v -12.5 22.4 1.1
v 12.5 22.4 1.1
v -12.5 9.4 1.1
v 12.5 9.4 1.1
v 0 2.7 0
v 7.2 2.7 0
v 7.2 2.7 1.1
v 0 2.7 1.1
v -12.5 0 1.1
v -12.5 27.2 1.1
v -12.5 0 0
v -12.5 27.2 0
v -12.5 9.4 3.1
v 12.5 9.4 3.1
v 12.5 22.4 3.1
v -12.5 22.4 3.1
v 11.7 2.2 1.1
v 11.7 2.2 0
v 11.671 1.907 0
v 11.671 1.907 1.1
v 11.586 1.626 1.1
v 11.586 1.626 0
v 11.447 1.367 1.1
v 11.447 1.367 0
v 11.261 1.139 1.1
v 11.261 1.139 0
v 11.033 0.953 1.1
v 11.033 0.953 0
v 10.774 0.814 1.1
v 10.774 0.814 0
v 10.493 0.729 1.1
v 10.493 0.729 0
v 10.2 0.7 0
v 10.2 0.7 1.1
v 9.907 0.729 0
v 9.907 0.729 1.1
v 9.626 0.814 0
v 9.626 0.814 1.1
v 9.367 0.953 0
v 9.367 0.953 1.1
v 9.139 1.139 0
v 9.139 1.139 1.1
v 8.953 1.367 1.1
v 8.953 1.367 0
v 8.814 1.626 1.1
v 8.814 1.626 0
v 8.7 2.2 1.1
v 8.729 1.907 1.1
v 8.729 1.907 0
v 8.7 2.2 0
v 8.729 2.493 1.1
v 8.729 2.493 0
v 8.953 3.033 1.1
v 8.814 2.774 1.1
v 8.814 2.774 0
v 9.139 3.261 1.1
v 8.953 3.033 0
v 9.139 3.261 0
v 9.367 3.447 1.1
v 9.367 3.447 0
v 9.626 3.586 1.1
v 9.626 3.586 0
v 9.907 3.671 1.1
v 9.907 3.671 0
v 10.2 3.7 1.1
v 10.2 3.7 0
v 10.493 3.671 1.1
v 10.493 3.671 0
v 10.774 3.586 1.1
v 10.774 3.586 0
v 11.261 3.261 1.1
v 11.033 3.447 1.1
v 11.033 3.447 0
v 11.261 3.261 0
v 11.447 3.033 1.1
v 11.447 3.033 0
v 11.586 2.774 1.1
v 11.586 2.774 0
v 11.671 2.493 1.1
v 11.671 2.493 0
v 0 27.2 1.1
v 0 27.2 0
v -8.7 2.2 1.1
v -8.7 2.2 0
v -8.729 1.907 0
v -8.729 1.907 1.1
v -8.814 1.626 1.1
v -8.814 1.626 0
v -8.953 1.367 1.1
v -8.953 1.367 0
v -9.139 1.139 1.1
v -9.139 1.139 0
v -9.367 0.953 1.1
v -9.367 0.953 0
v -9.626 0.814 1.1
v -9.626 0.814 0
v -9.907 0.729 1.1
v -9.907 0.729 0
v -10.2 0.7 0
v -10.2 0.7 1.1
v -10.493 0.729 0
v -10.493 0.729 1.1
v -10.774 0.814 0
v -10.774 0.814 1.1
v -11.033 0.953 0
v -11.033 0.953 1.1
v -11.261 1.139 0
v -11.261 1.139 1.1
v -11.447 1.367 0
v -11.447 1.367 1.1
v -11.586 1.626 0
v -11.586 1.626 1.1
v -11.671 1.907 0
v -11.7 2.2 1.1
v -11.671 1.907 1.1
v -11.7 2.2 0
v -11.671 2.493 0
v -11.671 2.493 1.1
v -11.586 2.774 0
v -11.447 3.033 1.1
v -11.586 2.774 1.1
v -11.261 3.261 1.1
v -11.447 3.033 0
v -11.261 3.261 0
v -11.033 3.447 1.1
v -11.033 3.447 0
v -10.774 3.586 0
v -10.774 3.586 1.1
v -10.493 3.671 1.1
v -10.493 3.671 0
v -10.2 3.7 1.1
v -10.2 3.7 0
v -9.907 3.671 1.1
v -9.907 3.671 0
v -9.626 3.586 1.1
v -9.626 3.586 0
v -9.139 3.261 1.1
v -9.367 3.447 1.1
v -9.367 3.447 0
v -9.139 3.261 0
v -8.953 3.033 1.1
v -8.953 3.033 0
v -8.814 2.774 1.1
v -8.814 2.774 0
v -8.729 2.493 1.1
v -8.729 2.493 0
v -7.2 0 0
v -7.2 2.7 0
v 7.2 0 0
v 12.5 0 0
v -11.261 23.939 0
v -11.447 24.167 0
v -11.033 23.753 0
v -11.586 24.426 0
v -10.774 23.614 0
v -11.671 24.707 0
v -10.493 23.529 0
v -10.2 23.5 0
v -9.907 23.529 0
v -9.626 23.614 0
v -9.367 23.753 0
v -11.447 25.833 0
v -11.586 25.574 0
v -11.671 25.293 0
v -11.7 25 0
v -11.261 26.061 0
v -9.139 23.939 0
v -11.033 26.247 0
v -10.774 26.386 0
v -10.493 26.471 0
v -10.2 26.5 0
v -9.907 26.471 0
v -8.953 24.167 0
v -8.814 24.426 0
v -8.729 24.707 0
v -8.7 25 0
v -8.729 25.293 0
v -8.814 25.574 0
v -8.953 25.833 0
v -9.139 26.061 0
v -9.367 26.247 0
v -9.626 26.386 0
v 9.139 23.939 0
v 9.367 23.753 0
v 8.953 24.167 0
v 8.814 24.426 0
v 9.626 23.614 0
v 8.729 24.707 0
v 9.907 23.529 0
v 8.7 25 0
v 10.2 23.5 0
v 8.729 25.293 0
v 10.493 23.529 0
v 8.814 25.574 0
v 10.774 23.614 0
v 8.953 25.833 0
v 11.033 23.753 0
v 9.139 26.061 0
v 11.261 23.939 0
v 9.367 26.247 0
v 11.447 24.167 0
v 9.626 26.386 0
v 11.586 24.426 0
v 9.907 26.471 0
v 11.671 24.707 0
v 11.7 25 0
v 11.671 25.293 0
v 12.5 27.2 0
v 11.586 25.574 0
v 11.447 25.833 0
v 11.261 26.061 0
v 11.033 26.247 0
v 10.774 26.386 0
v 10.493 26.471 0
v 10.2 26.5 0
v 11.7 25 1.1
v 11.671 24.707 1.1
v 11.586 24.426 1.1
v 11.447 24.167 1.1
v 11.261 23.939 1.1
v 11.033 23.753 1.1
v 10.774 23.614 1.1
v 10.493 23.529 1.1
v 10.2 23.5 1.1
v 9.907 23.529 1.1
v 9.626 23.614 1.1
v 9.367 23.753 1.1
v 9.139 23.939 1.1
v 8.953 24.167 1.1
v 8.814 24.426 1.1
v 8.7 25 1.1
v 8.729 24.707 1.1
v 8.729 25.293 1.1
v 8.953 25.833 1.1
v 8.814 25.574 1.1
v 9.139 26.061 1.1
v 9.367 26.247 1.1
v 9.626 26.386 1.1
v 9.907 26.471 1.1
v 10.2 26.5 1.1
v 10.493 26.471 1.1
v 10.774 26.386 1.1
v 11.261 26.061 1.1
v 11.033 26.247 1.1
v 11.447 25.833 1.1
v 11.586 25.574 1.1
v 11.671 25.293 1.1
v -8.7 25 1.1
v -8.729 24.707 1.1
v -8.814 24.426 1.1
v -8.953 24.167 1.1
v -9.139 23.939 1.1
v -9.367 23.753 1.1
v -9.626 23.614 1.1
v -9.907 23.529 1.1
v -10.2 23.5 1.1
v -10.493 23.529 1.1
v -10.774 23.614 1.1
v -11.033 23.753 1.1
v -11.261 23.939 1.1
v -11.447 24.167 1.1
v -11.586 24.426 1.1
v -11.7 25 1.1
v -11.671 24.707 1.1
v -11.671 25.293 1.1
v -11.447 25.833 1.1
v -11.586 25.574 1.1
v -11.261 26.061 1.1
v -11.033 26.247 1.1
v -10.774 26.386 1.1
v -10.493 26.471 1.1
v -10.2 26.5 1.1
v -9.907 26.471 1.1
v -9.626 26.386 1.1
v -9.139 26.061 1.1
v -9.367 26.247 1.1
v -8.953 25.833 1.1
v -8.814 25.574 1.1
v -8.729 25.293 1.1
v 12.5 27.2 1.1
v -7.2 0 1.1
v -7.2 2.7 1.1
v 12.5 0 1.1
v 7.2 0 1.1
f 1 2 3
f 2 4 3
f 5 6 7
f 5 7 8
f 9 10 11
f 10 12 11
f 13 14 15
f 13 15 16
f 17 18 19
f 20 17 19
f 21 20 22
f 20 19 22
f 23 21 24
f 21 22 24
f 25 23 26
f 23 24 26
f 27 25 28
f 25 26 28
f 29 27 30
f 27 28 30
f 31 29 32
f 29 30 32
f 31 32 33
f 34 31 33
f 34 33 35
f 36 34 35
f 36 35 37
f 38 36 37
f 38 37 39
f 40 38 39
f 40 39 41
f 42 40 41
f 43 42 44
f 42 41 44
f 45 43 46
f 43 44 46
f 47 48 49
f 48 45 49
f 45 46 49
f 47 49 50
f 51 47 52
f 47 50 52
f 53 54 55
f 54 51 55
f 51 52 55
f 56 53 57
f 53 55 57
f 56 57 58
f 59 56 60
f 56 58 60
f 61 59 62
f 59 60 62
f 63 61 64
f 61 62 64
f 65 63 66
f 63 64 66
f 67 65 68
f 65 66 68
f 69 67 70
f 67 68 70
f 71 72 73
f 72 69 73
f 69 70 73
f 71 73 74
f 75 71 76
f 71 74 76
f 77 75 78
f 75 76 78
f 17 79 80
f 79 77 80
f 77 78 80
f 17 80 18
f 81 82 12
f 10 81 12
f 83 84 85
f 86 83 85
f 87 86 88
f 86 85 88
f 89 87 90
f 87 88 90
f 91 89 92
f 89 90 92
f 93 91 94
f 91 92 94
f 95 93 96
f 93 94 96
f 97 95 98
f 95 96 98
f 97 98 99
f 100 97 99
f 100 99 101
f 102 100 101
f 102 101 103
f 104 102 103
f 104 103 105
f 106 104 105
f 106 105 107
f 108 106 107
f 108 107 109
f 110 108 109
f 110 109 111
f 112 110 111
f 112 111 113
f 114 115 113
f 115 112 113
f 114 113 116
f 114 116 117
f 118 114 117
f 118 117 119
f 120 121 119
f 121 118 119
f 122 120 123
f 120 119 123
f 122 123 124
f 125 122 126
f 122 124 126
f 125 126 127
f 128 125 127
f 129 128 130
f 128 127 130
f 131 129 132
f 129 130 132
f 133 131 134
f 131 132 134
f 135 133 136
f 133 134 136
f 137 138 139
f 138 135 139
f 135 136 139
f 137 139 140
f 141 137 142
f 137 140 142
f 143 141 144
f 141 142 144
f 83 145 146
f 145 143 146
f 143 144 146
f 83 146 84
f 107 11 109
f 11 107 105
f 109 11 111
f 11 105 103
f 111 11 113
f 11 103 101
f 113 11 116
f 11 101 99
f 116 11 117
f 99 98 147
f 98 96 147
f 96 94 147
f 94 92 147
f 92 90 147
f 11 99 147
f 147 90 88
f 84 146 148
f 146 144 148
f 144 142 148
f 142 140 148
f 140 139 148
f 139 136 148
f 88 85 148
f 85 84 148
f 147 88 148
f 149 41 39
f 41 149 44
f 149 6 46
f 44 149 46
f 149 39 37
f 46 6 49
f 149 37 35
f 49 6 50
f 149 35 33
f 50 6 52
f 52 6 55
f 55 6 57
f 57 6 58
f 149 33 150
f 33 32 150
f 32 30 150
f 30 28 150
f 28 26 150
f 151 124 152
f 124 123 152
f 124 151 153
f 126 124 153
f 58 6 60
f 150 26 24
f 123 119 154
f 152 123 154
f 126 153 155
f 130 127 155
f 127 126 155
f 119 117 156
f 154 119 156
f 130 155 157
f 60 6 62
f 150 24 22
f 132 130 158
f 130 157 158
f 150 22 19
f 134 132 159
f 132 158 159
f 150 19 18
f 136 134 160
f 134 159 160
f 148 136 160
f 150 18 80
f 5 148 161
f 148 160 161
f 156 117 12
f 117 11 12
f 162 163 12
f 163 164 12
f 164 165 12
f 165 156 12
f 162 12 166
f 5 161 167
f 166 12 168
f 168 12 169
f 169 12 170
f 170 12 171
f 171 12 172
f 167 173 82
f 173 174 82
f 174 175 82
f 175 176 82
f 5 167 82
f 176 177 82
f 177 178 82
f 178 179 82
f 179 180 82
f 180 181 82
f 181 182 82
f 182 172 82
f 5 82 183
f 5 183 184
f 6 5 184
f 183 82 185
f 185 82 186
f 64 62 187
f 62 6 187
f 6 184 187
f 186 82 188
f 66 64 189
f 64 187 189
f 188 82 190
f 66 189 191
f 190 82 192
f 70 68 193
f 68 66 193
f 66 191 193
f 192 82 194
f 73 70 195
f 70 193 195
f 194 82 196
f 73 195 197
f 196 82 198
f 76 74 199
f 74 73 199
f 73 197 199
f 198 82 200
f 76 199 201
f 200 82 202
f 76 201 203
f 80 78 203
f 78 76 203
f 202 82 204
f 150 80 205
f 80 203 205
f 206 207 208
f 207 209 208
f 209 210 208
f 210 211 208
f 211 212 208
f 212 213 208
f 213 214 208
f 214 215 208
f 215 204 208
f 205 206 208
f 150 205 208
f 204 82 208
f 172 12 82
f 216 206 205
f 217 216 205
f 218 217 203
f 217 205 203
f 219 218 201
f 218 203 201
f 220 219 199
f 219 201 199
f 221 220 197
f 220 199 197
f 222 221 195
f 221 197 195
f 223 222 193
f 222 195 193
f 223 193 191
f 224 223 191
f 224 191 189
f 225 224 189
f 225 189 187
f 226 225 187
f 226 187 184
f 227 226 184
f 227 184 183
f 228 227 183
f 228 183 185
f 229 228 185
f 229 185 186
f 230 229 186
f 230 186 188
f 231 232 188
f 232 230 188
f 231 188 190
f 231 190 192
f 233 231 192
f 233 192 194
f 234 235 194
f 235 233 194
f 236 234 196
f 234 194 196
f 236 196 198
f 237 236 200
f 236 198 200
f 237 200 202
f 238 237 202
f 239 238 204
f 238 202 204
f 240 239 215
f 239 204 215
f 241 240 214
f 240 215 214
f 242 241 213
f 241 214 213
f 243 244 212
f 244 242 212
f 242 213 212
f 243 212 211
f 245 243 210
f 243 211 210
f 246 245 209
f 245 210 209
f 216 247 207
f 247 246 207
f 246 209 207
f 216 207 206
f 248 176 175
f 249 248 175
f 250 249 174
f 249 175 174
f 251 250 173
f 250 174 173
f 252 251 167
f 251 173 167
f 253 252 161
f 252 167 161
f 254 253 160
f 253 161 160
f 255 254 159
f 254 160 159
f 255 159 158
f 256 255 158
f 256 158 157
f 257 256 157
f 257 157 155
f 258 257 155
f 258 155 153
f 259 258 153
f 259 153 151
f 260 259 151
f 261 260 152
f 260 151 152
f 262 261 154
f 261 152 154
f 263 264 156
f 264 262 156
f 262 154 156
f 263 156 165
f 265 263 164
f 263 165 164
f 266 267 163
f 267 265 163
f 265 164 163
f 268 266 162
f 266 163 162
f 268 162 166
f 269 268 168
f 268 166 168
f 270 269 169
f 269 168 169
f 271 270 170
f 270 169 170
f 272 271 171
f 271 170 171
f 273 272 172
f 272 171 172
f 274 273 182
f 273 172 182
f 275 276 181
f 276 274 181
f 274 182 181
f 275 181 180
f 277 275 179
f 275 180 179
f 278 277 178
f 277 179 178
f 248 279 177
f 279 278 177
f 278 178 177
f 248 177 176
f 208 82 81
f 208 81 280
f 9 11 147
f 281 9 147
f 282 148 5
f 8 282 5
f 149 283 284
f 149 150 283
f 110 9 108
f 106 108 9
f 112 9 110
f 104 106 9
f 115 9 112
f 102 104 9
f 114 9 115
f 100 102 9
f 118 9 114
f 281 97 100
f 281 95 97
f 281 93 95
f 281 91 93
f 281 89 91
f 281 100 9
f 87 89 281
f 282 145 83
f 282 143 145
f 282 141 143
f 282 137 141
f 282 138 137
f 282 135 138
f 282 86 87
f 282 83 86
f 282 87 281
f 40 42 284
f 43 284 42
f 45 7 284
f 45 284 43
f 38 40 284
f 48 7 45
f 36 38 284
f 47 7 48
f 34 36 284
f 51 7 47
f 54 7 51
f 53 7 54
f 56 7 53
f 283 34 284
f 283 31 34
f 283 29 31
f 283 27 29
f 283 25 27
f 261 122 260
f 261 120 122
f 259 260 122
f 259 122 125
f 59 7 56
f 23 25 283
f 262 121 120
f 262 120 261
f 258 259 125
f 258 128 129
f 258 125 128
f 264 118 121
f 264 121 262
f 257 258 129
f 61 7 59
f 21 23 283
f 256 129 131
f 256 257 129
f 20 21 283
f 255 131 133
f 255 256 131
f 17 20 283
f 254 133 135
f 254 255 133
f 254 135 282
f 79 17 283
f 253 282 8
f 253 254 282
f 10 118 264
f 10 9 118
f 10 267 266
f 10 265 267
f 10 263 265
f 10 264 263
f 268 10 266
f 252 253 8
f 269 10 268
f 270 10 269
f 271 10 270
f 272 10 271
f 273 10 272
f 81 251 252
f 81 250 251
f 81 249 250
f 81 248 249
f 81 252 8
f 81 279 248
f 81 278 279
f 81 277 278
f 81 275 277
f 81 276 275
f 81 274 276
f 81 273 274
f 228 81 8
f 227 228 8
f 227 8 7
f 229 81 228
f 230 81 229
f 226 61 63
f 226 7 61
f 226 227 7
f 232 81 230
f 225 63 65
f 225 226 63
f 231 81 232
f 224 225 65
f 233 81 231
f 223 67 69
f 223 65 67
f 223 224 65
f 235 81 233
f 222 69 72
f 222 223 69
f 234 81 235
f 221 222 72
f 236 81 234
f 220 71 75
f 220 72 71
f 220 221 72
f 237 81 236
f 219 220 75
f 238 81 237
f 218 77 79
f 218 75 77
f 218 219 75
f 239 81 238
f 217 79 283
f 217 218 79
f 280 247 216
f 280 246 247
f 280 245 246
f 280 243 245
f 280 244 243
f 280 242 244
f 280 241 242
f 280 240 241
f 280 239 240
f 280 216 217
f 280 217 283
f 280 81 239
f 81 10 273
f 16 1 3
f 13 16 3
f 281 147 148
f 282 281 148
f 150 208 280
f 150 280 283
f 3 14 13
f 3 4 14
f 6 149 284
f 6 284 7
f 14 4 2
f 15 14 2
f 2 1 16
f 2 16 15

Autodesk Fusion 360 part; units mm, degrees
sketch "Skizze1" plane through (0, 0, 0) normal (0, 0, 1) x (1, 0, 0) in component "board"
  line L0 (0, 0) -> (0, 67.6805) construction
  line L1 (0, 27.2) -> (-12.5, 27.2)
  line L2 (-12.5, 27.2) -> (-12.5, 0)
  line L3 (-12.5, 0) -> (-7.2, 0)
  line L4 (-7.2, 0) -> (-7.2, 2.7)
  line L5 (-7.2, 2.7) -> (0, 2.7)
  circle A0 centre (-10.2, 25) radius 1.5
  circle A1 centre (-10.2, 2.2) radius 1.5
  line L6 (12.5, 27.2) -> (12.5, 0)
  circle A2 centre (10.2, 25) radius 1.5
  circle A3 centre (10.2, 2.2) radius 1.5
  line L7 (12.5, 0) -> (7.2, 0)
  line L8 (7.2, 0) -> (7.2, 2.7)
  line L9 (7.2, 2.7) -> (0, 2.7)
  line L10 (0, 27.2) -> (12.5, 27.2)
  dimension "d1" = 12.5
  dimension "d2" = 27.2
  dimension "d3" = 5.3
  dimension "d4" = 2.7
  dimension "d5" = 3
  dimension "d6" = 2.2
  dimension "d7" = 2.3
  dimension "d8" = 3
  dimension "d9" = 2.3
  dimension "d10" = 2.2
extrude "Extrusion1" add sketch "Skizze1" along normal blind 1.1 makes body 1 in component "board"
sketch "Skizze1 (2)" plane through (0, 0, 1.1) normal (0, 0, 1) x (-1, 0, 0) in component "Component"
  circle A0 centre (-10.2, -2.2) radius 1.5
  circle A1 centre (10.2, -25) radius 1.5
  circle A2 centre (-10.2, -25) radius 1.5
  circle A3 centre (10.2, -2.2) radius 1.5
  line L0 (12.5, -27.2) -> (12.5, 0)
  line L1 (12.5, 0) -> (7.2, 0)
  line L2 (7.2, 0) -> (7.2, -2.7)
  line L3 (7.2, -2.7) -> (-7.2, -2.7)
  line L4 (-7.2, -2.7) -> (-7.2, 0)
  line L5 (-7.2, 0) -> (-12.5, 0)
  line L6 (-12.5, 0) -> (-12.5, -27.2)
  line L7 (-12.5, -27.2) -> (12.5, -27.2)
  line L8 (12.5, -22.4) -> (-12.5, -22.4)
  line L9 (-12.5, -22.4) -> (-12.5, -9.4)
  line L10 (-12.5, -9.4) -> (12.5, -9.4)
  line L11 (12.5, -9.4) -> (12.5, -22.4)
  dimension "d13" = 13
  dimension "d14" = 4.8
extrude "Extrusion1'" add sketch "Skizze1 (2)" along normal blind 2 separate body contours L0 L6 L8 L9 L10 L11 makes body 2 in component "Component"
component "board" placed x (1, 0, 0) y (0, 1, 0) z (0, 0, 1) at (0, 0, 0)
component "Component" placed x (1, 0, 0) y (0, 1, 0) z (0, 0, 1) at (0, 0, 0)
equation "d1 = ( 25 / 2 ) * 1 mm"
equation "d6 = d5 / 2 + 0.7 mm"
equation "d7 = d5 / 2 + 0.8 mm"
equation "d9 = d7"
equation "d10 = d6"
